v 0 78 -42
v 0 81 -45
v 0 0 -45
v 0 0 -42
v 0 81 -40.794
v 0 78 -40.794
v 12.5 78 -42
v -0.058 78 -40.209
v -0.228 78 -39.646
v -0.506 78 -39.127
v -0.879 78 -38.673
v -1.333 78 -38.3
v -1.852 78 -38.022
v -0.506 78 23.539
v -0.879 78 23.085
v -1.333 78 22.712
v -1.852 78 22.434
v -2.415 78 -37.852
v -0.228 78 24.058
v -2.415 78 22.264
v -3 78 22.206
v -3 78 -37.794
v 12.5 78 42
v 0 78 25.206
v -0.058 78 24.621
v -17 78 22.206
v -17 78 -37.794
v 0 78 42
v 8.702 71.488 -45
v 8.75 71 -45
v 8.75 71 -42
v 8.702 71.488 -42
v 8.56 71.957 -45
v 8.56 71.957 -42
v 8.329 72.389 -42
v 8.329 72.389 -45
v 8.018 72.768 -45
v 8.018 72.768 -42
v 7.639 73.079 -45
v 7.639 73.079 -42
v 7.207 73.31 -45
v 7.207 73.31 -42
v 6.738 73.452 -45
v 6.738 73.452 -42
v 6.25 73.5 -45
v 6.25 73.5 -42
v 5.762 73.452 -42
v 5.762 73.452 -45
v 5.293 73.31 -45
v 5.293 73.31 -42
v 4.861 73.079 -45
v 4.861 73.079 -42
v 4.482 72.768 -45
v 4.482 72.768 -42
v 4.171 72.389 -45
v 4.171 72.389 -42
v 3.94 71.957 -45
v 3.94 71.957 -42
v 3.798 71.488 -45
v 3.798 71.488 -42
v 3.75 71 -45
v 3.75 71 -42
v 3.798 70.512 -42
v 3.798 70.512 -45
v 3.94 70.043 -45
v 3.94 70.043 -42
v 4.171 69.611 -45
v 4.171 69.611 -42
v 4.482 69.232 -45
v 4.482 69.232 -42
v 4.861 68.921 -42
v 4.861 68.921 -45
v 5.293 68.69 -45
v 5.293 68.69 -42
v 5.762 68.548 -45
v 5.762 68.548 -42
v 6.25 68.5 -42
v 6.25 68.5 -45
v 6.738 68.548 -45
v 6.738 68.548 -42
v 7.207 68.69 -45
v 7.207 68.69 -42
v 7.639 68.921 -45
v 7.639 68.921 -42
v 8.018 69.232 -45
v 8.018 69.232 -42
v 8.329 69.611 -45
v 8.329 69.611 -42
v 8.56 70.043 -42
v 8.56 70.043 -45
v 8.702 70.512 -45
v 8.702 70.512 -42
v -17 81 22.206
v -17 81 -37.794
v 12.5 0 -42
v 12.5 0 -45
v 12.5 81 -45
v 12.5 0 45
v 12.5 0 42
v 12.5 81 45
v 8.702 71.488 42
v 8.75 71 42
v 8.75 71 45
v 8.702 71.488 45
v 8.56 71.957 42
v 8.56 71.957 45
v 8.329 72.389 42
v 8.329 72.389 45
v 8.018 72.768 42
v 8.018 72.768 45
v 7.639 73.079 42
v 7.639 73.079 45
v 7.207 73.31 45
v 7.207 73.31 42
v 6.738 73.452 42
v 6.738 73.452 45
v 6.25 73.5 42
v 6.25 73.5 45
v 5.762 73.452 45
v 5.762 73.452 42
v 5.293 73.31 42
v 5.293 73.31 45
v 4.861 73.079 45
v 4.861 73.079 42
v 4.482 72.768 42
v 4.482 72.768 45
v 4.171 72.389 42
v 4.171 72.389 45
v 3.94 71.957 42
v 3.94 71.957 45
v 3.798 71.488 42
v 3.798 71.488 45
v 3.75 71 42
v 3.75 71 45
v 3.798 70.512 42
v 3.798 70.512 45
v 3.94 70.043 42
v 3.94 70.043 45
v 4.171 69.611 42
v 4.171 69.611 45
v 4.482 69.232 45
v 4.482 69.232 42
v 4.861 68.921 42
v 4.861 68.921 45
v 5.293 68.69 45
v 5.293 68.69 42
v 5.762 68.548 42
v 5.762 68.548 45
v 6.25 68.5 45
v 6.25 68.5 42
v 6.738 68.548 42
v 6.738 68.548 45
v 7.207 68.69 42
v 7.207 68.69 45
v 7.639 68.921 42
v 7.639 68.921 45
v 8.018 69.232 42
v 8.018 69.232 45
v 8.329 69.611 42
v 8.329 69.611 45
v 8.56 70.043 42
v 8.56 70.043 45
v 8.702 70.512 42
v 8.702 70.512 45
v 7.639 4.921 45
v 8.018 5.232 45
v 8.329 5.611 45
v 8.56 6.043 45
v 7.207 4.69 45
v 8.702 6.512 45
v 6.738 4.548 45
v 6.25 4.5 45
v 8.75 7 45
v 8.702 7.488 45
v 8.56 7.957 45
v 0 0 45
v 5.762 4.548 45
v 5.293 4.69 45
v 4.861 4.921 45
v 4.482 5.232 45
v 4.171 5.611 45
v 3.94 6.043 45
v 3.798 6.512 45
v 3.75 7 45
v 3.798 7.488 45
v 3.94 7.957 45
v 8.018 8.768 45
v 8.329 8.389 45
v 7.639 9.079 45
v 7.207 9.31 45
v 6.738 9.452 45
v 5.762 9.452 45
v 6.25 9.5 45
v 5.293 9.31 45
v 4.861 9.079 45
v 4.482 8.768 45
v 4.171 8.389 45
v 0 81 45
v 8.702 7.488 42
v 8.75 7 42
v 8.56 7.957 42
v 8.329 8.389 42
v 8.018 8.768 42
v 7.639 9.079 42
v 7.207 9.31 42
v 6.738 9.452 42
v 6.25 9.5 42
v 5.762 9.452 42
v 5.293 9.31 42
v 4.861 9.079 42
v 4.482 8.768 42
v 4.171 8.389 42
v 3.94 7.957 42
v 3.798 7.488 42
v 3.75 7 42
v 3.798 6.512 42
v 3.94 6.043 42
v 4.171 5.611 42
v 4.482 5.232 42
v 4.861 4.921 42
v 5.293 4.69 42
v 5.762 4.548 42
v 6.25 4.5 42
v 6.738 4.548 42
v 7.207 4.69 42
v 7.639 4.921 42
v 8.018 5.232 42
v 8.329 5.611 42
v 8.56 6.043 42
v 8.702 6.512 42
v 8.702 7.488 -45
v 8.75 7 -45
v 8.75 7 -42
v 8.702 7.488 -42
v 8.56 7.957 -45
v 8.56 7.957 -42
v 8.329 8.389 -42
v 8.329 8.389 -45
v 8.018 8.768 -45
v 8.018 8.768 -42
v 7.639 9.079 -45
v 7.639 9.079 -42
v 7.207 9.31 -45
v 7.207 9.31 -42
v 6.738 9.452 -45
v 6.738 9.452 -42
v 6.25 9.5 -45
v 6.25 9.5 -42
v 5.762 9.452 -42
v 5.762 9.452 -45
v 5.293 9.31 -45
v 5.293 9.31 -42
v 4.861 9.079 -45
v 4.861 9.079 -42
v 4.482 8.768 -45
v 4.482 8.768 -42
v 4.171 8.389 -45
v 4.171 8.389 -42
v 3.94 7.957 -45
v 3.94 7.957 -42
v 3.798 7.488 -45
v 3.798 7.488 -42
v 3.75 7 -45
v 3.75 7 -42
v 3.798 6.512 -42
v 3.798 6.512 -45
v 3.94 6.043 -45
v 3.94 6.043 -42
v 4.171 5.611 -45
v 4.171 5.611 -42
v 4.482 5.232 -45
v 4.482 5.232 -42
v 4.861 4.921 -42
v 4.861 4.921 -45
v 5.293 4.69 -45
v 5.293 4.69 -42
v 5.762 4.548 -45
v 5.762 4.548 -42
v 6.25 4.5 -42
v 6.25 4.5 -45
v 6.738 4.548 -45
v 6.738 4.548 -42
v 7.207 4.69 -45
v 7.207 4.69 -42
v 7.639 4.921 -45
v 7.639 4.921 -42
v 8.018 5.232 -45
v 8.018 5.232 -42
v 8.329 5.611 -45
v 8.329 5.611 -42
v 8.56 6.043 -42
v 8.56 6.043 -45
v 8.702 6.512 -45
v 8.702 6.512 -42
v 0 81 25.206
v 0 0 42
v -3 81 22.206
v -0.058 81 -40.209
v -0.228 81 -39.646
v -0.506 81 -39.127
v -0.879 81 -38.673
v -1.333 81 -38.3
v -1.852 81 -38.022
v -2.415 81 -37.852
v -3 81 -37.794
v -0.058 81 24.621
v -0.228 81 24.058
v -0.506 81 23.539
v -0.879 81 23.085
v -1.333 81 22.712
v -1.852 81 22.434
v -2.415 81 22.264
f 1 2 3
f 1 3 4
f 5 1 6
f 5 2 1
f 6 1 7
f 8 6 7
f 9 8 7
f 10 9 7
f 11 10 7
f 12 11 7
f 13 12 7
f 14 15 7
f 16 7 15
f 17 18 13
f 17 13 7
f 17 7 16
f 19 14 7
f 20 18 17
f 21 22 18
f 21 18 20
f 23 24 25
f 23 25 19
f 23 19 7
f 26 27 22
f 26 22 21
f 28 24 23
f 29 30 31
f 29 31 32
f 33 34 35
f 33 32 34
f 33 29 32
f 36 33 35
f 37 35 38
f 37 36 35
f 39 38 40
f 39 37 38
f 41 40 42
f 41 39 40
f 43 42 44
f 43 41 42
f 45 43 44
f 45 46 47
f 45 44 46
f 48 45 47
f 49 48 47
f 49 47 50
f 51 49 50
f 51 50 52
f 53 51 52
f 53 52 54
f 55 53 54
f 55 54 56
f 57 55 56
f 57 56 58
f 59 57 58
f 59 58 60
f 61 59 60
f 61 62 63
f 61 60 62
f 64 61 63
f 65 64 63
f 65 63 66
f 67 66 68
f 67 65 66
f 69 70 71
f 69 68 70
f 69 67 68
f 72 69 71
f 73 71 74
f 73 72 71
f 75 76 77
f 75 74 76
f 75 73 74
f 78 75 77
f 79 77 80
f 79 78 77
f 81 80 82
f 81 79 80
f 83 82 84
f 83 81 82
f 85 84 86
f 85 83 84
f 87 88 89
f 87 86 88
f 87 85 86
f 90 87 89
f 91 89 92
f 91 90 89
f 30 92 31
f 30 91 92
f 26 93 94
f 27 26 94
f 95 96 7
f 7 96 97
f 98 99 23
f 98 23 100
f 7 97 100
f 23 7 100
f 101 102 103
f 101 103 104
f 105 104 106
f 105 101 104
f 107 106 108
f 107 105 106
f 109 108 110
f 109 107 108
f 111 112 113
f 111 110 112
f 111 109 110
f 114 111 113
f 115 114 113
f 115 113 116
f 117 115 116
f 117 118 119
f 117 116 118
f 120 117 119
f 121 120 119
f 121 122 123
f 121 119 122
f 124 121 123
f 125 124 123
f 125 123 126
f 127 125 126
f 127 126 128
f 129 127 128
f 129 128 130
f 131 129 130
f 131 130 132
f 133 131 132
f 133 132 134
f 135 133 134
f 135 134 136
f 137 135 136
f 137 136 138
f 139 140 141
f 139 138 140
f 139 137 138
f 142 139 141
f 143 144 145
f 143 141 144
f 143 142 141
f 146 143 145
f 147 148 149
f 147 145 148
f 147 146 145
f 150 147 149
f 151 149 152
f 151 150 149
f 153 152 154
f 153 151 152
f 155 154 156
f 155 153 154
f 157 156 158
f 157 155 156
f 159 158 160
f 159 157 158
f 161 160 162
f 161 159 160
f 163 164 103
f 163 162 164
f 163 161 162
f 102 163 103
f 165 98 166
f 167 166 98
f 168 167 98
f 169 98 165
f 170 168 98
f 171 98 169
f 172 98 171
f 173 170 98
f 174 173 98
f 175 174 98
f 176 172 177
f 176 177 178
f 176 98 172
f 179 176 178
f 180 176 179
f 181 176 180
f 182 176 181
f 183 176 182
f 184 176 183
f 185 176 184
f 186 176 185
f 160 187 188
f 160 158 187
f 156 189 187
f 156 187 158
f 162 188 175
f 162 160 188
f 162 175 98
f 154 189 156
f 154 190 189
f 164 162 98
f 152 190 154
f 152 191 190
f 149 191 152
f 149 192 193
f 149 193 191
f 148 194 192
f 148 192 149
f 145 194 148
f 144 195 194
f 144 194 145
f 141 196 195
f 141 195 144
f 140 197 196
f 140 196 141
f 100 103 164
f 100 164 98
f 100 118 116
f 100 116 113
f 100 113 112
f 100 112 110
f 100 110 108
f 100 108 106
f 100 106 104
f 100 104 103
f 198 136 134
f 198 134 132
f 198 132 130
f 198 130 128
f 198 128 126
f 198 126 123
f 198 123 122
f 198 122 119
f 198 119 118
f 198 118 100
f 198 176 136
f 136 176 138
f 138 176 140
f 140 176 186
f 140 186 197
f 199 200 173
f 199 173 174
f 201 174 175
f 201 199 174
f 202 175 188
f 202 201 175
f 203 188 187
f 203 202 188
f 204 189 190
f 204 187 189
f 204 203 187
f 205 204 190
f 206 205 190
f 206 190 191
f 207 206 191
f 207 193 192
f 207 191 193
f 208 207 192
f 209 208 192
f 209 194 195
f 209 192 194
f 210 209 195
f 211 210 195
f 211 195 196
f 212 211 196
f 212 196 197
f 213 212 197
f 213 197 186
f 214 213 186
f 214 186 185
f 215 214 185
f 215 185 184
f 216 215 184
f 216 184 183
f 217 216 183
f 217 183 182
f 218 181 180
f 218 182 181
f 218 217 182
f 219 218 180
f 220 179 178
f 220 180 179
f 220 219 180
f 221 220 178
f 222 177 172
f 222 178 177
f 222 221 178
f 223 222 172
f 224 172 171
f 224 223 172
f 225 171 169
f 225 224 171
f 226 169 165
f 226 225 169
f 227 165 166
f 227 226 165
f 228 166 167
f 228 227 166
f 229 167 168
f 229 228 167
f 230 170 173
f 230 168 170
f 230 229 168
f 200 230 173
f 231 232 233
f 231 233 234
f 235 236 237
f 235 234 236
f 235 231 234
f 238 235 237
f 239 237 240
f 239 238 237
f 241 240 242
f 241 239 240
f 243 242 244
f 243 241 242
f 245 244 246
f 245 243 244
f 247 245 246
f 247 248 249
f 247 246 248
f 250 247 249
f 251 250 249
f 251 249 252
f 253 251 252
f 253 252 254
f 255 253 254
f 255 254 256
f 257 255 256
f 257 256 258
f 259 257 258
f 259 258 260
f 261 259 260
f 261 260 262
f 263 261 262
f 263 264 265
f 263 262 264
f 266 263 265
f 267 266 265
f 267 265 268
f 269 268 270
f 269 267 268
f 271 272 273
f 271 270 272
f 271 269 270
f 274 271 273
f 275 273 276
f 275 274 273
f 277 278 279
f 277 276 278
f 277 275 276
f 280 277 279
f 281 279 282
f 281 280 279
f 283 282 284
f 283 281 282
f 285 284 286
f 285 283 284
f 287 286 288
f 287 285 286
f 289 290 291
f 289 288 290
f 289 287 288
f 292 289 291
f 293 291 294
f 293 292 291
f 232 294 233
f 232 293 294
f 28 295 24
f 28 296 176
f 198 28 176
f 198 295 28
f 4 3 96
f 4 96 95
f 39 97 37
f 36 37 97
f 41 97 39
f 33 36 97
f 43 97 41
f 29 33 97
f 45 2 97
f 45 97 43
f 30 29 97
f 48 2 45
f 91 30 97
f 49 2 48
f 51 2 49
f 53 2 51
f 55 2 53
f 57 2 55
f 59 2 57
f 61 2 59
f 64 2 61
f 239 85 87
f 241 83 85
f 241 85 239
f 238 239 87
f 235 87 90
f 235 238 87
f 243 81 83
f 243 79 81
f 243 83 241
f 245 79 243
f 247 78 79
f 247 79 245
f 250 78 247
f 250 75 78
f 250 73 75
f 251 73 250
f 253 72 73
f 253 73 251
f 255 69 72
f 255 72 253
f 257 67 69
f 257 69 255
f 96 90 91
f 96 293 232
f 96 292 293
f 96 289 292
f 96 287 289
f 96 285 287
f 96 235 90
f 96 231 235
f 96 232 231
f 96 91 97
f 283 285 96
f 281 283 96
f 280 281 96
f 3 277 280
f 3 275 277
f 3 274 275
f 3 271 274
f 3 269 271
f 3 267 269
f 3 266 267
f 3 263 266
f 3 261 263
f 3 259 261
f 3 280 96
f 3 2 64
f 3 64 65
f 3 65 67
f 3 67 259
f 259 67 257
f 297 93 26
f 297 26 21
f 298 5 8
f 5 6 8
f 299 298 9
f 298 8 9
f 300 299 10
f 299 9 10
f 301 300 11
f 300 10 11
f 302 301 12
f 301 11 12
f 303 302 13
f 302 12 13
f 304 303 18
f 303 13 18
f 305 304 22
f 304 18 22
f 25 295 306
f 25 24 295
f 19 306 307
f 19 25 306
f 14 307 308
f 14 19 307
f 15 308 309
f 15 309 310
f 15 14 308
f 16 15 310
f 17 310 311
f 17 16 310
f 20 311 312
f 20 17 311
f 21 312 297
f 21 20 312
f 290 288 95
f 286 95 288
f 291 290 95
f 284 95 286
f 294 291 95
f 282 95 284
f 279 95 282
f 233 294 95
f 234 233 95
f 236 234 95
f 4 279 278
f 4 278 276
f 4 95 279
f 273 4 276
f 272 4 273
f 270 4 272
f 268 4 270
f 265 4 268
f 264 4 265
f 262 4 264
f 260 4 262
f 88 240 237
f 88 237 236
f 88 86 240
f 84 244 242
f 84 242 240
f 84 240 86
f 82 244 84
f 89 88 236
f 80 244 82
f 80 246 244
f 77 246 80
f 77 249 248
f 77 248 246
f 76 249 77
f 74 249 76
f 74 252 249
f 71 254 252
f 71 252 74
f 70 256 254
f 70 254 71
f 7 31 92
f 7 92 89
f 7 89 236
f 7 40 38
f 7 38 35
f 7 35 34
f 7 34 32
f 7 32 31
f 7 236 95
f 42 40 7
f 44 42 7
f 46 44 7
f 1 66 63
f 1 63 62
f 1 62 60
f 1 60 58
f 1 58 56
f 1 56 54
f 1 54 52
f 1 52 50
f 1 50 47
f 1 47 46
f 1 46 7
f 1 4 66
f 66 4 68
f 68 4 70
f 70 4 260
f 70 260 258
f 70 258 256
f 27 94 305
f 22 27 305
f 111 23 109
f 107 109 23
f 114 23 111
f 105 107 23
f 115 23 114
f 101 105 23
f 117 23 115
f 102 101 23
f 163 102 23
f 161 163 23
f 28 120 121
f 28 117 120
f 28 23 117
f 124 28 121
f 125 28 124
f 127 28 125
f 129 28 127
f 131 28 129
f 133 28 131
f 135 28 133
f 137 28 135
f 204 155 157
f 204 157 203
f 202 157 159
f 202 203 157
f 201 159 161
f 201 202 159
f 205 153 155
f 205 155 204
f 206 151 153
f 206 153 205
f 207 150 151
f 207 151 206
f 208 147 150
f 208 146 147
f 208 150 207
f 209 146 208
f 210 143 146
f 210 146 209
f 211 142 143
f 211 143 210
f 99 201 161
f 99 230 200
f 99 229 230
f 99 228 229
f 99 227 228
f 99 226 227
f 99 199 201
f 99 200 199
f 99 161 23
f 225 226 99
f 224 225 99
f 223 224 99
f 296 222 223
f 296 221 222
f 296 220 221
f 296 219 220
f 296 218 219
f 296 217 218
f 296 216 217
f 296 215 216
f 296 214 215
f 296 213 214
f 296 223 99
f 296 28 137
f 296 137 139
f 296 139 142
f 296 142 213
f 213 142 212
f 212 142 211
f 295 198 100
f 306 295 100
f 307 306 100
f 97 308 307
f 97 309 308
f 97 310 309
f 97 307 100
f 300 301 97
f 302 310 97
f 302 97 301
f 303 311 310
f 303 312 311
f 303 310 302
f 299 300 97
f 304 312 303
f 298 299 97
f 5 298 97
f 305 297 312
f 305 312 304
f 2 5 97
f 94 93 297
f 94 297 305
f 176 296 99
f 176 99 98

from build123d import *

# Parameters (mm, degrees)
BOSS_EXTRUDE1_DEPTH     = 12.5
CUT_EXTRUDE1_DEPTH      = 122.726127023
CUT_EXTRUDE1_DEPTH_BACK = 122.726127023
SKETCH3_R               = 2.5
SKETCH2_W               = 17
SKETCH2_H               = 60
BOSS_EXTRUDE2_DEPTH     = 3
FILLET1_R               = 3


with BuildPart() as part:
    # Sketch1 → Boss-Extrude1 (new body)
    with BuildSketch(Plane(origin=(0, 0, 0), x_dir=(0, 0, -1), z_dir=(1, 0, 0))):
        Polygon((42, 78), (-42, 78), (-42, 0), (-45, 0), (-45, 81), (45, 81), (45, 0), (42, 0), align=None)
    extrude(amount=BOSS_EXTRUDE1_DEPTH)

    # Sketch3 → Cut-Extrude1 (cut, two sides: drawn at the far end of the back side and taken through both)
    with BuildSketch(Plane.XY.offset(45).offset(-CUT_EXTRUDE1_DEPTH_BACK)):
        with Locations((6.25, 71)):
            Circle(SKETCH3_R)
        with Locations((6.25, 7)):
            Circle(SKETCH3_R)
    extrude(amount=CUT_EXTRUDE1_DEPTH + CUT_EXTRUDE1_DEPTH_BACK, mode=Mode.SUBTRACT)

    # Sketch2 → Boss-Extrude2 (add)
    with BuildSketch(Plane(origin=(0, 81, 0), x_dir=(1, 0, 0), z_dir=(0, 1, 0))):
        with Locations((-8.5, 7.794002847)):
            Rectangle(SKETCH2_W, SKETCH2_H)
    extrude(amount=-BOSS_EXTRUDE2_DEPTH)

    # Fillet1
    fillet1_edges = [part.edges().sort_by_distance(p)[0] for p in [
        (0, 79.5, -37.794002847),
        (0, 79.5, 22.205997153),
    ]]
    fillet(fillet1_edges, radius=FILLET1_R)


solid = part.part
